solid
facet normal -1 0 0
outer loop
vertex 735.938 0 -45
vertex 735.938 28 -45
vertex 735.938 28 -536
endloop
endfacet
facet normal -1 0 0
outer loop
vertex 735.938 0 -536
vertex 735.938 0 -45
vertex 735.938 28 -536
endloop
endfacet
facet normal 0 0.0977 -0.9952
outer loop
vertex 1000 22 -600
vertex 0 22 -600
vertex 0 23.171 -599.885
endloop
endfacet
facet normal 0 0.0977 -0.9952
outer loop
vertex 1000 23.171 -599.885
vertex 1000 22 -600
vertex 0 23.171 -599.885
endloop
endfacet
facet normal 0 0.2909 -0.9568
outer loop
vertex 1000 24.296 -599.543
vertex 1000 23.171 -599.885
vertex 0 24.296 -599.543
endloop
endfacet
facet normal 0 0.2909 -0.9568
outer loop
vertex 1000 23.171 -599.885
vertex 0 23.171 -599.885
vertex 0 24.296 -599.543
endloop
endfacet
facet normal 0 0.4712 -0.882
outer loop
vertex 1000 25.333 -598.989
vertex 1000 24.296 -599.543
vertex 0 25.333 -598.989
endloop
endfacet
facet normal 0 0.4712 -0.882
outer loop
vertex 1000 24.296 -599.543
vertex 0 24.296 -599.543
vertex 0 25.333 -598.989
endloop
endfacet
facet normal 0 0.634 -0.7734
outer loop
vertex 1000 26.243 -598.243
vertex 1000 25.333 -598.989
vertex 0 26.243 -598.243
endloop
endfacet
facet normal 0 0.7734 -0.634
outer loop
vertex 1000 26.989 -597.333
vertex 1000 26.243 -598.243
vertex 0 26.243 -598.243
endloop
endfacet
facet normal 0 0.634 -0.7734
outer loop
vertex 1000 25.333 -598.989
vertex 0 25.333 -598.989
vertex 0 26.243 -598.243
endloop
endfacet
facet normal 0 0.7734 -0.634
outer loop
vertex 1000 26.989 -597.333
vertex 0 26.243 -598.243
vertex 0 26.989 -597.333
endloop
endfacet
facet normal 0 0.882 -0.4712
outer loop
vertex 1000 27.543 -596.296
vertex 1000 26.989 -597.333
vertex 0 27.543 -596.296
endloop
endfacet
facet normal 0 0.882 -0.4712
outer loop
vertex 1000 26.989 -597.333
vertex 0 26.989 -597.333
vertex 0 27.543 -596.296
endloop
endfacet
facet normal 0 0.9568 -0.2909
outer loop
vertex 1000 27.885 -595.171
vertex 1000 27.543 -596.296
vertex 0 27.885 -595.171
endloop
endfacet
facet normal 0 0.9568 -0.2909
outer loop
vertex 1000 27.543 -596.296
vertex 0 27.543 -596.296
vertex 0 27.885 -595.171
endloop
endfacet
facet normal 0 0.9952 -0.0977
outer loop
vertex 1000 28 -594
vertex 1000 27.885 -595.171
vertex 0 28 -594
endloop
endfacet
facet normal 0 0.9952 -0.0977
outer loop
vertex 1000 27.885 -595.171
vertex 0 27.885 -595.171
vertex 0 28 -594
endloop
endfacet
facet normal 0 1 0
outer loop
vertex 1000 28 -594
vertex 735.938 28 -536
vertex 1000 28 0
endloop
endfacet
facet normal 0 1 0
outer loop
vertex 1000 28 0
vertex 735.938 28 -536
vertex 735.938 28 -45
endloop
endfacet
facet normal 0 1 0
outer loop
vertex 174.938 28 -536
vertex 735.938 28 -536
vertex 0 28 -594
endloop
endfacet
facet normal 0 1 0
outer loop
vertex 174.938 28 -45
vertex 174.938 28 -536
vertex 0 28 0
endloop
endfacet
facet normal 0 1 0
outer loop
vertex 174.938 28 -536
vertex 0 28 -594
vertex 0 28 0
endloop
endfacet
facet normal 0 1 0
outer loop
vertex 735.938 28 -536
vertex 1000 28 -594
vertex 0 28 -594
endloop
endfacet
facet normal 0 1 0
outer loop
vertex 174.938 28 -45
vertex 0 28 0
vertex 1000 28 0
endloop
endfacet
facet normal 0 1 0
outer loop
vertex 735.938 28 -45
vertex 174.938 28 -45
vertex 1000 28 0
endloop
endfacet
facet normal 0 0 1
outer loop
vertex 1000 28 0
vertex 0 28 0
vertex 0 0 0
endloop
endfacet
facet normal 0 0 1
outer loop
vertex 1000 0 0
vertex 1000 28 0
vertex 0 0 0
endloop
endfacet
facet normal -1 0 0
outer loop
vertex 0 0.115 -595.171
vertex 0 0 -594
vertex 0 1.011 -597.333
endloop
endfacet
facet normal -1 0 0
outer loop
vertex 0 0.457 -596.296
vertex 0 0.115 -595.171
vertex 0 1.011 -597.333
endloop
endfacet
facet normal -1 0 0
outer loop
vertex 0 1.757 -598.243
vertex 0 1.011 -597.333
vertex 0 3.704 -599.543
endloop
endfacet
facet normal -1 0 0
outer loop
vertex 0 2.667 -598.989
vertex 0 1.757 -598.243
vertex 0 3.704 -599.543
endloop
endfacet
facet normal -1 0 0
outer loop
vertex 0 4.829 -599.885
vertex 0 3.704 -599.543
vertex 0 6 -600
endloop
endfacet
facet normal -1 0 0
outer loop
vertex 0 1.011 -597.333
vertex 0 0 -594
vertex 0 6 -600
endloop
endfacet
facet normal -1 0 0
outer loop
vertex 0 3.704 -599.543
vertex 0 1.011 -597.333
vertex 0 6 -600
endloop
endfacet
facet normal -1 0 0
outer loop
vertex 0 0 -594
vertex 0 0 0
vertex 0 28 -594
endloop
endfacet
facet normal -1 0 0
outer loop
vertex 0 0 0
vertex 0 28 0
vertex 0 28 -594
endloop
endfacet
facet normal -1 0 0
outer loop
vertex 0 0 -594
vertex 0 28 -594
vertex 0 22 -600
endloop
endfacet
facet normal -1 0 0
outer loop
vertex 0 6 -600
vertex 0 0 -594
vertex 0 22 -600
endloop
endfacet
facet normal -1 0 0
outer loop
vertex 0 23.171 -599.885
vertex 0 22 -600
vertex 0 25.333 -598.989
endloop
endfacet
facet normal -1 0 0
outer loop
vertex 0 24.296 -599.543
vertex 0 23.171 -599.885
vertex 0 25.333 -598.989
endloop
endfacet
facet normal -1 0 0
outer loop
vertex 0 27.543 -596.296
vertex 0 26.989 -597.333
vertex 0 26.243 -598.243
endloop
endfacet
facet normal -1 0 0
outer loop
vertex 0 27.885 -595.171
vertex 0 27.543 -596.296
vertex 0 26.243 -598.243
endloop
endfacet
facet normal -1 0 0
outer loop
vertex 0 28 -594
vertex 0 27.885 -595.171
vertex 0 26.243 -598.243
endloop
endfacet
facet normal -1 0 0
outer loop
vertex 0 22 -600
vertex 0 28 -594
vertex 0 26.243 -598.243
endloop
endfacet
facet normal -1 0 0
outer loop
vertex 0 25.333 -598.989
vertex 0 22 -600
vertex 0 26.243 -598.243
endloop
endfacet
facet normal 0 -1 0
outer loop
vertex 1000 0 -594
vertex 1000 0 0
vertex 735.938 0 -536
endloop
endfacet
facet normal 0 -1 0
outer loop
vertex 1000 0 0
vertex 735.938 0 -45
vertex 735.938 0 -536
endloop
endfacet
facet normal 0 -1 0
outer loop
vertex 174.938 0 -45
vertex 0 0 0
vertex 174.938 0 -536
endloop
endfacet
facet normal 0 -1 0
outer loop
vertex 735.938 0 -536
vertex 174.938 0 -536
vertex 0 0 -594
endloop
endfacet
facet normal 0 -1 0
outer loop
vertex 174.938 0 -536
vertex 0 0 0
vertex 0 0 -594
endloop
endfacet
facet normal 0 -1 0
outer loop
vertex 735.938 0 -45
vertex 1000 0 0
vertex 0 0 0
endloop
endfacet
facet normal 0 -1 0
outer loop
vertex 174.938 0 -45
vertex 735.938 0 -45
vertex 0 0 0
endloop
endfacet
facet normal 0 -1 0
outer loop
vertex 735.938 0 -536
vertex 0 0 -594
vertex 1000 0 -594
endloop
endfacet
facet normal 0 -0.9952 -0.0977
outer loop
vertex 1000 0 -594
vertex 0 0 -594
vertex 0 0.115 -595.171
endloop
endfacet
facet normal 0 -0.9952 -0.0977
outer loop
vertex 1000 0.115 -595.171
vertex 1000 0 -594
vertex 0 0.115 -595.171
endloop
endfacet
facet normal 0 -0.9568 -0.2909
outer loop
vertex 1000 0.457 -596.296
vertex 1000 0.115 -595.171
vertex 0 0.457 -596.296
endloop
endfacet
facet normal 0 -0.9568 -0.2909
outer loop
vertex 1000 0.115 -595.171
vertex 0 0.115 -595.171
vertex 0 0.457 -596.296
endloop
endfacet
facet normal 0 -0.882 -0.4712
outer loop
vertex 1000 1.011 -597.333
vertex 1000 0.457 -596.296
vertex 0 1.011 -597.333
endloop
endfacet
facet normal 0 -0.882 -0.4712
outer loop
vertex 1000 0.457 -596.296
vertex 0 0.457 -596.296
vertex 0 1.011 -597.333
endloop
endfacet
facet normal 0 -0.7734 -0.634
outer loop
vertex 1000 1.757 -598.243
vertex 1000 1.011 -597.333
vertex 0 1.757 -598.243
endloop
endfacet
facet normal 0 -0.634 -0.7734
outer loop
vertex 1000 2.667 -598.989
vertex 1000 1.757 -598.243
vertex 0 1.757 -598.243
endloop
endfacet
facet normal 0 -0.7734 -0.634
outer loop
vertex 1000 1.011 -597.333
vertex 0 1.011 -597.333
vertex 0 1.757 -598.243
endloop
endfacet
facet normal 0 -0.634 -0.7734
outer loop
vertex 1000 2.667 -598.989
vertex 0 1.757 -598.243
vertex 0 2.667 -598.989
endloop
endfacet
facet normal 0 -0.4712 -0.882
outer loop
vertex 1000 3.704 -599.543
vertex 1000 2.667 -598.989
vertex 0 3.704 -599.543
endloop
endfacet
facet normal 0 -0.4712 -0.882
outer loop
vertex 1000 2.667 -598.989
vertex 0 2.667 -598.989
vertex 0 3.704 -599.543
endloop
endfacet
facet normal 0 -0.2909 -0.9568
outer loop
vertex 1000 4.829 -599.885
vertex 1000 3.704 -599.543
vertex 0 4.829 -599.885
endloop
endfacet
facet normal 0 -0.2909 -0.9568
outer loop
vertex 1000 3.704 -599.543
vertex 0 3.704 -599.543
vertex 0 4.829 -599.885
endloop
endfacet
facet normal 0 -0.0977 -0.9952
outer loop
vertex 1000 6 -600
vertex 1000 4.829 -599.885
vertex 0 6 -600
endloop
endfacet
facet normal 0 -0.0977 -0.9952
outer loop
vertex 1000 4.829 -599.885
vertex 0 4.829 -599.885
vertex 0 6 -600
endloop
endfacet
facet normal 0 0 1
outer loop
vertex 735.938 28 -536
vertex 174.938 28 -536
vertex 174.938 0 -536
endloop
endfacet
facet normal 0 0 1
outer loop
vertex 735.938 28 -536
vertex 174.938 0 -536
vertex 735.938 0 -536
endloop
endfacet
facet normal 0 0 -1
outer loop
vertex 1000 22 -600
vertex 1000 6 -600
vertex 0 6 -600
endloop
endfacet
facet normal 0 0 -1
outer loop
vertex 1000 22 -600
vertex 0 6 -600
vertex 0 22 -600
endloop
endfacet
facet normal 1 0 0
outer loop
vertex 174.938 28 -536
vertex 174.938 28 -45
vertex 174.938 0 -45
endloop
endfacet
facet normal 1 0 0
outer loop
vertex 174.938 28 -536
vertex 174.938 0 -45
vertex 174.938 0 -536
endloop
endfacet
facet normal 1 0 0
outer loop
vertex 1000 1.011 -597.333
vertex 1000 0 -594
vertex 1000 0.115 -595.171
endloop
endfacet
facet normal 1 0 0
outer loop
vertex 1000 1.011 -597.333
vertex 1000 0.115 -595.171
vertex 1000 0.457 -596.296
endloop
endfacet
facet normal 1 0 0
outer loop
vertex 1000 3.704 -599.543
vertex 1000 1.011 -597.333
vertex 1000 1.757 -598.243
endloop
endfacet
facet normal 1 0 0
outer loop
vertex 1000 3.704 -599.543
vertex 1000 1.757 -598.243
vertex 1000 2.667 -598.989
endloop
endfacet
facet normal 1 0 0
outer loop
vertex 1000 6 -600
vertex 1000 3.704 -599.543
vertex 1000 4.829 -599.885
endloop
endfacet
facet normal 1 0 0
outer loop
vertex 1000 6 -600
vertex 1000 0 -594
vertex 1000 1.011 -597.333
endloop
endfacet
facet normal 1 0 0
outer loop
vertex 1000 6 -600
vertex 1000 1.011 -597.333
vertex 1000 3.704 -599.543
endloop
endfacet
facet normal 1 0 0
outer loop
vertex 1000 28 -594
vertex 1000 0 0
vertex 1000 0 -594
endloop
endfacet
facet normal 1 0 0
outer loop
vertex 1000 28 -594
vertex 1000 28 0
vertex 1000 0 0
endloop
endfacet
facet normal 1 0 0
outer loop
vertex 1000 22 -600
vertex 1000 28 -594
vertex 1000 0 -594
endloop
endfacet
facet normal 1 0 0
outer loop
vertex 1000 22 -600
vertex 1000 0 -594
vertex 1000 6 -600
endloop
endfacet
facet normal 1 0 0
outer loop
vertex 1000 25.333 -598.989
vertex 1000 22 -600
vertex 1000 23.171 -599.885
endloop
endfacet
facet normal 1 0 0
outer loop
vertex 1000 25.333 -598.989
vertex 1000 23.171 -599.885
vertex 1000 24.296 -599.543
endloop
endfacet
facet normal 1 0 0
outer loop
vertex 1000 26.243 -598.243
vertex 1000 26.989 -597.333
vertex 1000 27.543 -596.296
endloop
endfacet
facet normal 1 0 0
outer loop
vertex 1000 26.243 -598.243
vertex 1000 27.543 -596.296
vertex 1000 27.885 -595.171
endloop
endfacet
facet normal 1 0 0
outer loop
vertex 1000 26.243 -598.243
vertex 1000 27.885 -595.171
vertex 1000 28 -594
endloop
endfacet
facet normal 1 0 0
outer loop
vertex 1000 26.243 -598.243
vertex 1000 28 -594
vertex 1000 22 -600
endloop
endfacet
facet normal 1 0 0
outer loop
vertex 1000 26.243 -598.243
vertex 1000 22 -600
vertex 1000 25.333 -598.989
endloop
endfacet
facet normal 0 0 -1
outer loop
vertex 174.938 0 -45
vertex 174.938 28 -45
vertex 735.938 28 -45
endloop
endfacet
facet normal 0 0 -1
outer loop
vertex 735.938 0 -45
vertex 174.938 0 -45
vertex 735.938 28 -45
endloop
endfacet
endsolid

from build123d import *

# Parameters (mm, degrees)
EXTRUDE_1_DEPTH     = 1000
SKETCH_3_W          = 561
SKETCH_3_H          = 491
CUT_EXTRUDE_1_DEPTH = 29


with BuildPart() as part:
    # Эскиз2 → Бобышка-Вытянуть1 (new body)
    with BuildSketch(Plane(origin=(0, 0, 0), x_dir=(0, 0, -1), z_dir=(1, 0, 0))):
        with BuildLine():
            Line((0, 0), (594, 0))
            ThreePointArc((594, 0), (598.242640687, 1.757359313), (600, 6))
            Line((600, 6), (600, 22))
            ThreePointArc((600, 22), (598.242640687, 26.242640687), (594, 28))
            Line((594, 28), (0, 28))
            Line((0, 28), (0, 0))
        make_face()
    extrude(amount=EXTRUDE_1_DEPTH)

    # Эскиз3 → Вырез-Вытянуть1 (cut, through all)
    with BuildSketch(Plane(origin=(0, 28, 0), x_dir=(1, 0, 0), z_dir=(0, 1, 0))):
        with Locations((455.438358963, 290.5)):
            Rectangle(SKETCH_3_W, SKETCH_3_H)
    extrude(amount=-CUT_EXTRUDE_1_DEPTH, mode=Mode.SUBTRACT)


solid = part.part
